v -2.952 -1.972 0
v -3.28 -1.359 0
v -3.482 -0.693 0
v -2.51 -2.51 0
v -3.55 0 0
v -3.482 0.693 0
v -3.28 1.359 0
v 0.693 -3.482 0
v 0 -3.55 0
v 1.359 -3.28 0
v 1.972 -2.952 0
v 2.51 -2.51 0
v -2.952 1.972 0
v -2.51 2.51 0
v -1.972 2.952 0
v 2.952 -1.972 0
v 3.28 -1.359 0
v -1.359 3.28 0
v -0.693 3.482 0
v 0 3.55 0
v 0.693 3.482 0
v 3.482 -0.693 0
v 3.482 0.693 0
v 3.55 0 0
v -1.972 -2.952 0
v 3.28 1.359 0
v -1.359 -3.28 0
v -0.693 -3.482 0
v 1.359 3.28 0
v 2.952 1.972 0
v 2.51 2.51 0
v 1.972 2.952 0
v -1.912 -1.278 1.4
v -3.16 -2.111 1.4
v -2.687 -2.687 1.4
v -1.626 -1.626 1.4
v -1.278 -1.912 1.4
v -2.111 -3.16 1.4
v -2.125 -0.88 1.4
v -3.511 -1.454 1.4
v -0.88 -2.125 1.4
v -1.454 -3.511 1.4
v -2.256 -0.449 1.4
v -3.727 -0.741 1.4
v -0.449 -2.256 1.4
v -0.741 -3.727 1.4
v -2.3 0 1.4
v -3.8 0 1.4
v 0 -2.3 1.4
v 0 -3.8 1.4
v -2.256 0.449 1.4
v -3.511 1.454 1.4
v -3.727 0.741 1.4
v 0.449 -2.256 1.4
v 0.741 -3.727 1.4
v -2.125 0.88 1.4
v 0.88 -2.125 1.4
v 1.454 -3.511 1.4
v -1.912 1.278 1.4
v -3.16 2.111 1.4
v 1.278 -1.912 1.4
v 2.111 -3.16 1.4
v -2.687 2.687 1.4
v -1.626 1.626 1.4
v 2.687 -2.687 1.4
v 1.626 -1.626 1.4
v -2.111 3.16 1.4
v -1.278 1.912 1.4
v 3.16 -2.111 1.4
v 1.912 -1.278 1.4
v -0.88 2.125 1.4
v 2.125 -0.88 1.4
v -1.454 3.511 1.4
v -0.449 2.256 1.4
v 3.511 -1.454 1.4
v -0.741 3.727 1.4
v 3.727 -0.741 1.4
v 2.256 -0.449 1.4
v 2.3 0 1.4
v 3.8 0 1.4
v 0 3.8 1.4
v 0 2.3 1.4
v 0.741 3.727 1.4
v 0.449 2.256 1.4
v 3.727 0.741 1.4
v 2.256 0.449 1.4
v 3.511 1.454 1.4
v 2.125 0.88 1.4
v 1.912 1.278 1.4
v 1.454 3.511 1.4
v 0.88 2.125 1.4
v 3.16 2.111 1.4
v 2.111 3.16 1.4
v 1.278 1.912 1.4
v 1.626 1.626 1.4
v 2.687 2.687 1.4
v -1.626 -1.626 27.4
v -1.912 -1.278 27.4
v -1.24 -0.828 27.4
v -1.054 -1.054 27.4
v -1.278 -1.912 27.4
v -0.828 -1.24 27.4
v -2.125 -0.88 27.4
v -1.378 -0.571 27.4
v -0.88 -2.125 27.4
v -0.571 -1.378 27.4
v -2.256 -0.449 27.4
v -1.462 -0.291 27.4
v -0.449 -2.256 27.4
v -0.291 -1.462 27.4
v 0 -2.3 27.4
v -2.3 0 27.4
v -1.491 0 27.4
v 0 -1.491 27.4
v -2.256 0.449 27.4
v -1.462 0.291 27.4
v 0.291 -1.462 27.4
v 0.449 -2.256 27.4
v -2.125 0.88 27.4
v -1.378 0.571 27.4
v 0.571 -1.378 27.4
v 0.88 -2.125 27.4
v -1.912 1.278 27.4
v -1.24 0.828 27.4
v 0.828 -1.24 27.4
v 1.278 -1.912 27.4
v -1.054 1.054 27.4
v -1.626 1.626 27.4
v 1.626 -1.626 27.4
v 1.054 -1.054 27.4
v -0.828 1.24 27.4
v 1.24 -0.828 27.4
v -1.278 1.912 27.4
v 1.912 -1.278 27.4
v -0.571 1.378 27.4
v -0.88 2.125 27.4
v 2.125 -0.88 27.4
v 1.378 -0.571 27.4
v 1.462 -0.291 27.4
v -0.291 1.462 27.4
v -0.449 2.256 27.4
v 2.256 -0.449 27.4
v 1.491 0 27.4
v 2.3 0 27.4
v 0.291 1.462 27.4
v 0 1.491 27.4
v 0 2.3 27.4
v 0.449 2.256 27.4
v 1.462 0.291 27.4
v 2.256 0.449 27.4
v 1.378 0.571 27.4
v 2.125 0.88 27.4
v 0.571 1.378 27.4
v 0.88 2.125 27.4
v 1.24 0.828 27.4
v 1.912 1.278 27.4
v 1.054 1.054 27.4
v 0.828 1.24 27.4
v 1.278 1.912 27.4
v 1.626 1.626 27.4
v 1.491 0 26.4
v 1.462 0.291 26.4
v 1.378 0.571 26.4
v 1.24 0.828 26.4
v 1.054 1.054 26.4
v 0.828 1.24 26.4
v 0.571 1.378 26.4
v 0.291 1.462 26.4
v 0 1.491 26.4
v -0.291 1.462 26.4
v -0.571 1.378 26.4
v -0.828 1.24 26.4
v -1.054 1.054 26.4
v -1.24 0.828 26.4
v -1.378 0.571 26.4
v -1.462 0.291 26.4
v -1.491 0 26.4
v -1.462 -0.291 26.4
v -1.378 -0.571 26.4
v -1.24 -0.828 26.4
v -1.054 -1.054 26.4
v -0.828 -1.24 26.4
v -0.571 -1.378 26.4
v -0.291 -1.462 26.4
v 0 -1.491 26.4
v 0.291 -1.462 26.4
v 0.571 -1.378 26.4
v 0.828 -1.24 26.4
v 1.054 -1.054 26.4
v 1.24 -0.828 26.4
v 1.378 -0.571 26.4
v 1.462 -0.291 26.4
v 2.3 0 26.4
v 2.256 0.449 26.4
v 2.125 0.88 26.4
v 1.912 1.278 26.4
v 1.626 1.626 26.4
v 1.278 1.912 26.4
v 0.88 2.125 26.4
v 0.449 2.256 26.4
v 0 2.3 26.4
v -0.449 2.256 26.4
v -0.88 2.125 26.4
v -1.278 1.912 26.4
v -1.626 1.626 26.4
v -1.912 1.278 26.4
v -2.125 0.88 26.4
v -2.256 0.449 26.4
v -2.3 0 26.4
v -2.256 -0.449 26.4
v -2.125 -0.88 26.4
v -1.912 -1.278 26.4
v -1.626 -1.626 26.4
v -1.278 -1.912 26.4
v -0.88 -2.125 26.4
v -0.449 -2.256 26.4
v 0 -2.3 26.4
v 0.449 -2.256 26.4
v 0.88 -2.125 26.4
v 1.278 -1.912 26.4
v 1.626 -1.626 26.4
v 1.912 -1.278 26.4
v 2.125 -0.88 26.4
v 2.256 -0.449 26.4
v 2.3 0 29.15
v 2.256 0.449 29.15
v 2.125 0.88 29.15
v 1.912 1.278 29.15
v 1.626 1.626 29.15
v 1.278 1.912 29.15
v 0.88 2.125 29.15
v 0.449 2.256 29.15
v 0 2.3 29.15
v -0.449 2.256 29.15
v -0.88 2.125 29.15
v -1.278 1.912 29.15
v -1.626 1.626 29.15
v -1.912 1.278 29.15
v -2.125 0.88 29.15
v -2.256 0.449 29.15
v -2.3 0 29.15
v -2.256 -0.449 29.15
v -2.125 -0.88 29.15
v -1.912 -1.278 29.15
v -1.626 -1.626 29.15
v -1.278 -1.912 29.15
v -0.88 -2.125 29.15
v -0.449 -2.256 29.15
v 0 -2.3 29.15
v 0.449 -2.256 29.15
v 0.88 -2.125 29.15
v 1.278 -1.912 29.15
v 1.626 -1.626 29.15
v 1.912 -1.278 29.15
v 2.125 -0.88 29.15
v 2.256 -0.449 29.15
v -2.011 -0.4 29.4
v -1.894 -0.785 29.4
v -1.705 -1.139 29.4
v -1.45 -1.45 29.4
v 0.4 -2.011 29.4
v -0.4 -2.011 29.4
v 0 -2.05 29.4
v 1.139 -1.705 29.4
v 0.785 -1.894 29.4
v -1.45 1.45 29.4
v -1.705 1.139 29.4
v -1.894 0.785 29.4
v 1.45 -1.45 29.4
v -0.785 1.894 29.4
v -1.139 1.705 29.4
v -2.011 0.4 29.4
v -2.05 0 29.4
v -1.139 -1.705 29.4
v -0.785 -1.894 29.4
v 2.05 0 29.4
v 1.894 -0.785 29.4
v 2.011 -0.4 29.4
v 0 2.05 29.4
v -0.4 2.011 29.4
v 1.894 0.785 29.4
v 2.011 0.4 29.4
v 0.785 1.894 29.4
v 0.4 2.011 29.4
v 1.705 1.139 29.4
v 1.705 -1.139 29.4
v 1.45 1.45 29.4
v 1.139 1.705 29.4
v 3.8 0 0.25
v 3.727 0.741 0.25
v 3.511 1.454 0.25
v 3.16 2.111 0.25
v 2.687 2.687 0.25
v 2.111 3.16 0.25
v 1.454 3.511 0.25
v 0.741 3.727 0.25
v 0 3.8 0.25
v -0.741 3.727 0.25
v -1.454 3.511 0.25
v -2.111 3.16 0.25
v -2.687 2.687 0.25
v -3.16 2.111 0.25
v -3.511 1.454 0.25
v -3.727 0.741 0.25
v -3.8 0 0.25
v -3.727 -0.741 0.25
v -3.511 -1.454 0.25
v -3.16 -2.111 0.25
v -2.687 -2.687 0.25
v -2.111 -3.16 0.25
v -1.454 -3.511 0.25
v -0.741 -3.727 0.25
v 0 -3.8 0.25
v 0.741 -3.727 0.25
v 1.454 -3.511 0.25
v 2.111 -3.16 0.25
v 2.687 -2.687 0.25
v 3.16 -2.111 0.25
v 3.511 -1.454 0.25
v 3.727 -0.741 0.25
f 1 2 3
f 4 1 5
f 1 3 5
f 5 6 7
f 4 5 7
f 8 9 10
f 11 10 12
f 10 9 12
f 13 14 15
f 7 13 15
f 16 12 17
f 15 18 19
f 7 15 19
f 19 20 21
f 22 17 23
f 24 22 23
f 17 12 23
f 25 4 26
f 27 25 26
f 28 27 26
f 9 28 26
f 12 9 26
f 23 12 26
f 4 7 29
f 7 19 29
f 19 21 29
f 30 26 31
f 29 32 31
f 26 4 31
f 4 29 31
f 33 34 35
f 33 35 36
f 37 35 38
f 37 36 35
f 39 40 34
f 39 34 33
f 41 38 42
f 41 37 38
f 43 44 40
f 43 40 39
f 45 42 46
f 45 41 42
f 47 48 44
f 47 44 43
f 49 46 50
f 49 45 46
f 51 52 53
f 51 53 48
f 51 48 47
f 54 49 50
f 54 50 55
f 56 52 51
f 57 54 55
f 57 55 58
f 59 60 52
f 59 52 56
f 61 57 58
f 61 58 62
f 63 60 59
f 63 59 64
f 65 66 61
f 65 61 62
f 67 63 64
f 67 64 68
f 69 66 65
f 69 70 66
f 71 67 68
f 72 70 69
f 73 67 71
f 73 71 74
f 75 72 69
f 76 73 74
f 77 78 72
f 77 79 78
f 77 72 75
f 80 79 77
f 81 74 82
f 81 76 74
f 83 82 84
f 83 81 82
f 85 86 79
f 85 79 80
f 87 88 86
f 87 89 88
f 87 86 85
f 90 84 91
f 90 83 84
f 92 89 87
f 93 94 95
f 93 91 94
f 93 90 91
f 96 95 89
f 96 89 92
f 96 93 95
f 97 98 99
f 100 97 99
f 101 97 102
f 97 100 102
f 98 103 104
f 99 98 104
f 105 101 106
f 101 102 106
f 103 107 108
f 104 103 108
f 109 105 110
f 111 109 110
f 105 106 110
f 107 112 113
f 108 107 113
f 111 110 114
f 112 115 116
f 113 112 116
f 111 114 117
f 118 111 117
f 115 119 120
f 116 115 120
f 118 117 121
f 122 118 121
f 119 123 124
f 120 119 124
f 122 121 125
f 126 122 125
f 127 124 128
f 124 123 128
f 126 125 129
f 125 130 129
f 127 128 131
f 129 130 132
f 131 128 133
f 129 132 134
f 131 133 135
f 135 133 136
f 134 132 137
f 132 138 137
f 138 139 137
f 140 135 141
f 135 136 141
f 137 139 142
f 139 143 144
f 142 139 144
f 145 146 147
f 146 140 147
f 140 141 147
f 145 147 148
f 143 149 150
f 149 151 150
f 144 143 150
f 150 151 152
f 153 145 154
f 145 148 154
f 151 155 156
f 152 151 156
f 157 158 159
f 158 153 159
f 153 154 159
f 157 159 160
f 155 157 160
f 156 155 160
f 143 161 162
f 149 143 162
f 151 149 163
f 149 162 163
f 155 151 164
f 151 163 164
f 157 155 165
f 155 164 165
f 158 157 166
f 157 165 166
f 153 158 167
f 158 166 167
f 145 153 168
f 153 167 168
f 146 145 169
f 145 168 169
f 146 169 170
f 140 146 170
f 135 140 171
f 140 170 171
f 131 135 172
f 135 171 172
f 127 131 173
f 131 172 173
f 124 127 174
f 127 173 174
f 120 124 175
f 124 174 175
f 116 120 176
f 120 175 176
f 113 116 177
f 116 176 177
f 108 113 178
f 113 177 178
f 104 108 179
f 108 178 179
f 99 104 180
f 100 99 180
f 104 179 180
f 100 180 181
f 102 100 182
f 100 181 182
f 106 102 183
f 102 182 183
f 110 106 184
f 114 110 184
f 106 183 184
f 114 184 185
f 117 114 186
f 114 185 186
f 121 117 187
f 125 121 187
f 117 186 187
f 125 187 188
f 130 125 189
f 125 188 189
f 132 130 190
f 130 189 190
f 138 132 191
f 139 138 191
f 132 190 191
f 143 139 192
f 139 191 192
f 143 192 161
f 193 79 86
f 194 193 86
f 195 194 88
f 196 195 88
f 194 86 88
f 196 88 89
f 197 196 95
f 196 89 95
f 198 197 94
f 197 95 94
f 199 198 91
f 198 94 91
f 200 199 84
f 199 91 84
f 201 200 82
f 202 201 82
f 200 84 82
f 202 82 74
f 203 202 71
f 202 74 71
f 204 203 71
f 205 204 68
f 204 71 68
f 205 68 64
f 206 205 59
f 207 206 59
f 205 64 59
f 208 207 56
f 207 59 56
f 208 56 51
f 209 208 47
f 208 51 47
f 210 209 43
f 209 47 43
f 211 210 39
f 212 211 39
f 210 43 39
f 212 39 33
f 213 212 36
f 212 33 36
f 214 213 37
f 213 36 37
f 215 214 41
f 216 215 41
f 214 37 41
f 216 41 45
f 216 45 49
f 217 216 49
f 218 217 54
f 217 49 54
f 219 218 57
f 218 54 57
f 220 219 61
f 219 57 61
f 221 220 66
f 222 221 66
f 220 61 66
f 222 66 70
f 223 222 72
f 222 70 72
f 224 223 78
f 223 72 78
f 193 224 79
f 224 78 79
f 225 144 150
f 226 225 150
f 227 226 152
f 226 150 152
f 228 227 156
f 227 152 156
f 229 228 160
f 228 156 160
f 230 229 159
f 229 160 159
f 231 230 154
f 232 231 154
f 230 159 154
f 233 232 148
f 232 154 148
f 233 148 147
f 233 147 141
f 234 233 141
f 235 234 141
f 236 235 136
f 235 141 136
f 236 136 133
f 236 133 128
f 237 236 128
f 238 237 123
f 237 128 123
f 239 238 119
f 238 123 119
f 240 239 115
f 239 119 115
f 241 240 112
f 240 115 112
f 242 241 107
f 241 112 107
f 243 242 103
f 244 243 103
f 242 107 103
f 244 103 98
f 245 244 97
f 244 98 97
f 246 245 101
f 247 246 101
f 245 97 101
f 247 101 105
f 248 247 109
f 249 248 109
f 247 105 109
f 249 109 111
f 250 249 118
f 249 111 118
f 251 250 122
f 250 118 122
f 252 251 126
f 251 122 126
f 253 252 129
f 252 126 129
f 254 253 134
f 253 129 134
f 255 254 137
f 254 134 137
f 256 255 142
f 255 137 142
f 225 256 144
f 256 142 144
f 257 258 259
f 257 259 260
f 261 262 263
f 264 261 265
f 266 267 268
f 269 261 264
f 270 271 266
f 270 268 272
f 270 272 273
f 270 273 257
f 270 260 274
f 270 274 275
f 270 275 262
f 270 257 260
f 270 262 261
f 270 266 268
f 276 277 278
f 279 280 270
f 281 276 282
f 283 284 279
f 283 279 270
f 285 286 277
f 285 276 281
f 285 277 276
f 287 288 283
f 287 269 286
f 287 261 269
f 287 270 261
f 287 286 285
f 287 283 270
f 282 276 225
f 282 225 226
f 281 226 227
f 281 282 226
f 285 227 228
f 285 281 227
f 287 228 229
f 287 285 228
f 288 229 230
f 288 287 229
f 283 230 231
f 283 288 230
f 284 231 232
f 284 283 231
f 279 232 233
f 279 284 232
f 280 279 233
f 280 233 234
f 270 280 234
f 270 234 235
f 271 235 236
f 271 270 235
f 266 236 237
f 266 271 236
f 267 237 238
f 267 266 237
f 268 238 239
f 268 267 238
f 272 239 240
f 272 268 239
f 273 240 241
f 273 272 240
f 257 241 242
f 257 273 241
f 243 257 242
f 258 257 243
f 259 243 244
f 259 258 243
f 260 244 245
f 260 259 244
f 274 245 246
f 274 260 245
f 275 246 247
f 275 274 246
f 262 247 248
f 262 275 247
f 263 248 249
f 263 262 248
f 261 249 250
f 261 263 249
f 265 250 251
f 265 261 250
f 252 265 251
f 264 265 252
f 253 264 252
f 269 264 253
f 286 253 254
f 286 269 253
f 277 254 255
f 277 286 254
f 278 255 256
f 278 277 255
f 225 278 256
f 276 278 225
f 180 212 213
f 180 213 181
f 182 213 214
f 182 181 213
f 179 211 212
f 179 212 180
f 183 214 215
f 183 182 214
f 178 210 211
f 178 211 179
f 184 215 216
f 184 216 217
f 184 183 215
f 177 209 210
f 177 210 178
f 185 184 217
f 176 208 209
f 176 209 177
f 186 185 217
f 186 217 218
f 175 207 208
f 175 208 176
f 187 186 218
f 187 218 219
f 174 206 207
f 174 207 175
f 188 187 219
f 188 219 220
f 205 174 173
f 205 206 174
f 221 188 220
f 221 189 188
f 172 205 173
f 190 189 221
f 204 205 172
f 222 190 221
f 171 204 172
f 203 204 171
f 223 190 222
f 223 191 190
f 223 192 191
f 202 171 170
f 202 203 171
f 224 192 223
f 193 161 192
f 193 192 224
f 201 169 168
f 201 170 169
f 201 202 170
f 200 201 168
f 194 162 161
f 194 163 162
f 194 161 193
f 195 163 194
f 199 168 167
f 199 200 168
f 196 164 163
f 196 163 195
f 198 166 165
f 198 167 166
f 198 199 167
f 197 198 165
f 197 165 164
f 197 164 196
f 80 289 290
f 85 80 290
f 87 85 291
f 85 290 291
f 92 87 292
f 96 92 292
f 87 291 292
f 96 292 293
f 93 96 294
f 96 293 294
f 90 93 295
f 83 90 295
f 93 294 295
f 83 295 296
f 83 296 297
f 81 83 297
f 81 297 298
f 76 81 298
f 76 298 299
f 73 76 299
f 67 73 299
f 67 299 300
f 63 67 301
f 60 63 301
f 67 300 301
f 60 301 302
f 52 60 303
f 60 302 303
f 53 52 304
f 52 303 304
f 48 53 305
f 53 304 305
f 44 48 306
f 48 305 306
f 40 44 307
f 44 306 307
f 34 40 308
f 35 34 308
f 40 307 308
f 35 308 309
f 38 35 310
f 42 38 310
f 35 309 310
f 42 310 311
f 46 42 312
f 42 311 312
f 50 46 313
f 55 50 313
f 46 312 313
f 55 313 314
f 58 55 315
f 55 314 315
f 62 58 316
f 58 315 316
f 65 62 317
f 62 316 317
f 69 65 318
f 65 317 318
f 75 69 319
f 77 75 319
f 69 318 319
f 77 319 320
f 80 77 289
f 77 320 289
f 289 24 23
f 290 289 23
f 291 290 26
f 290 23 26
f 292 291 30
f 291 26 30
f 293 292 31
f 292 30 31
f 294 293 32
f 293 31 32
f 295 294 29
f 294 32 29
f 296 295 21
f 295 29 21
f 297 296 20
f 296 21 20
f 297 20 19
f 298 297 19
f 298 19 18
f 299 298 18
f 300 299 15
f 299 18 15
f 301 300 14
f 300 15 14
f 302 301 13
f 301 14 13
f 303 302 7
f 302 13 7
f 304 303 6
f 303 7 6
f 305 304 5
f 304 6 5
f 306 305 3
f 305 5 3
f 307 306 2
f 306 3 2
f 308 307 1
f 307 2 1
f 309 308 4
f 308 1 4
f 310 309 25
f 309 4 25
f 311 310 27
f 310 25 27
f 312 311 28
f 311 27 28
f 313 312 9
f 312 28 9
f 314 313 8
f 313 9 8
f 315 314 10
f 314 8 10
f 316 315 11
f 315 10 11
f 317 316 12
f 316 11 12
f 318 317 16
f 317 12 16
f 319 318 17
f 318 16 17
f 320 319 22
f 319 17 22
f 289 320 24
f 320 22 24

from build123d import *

# Parameters (mm, degrees)
SKETCH_R     = 3.8
PAD_DEPTH    = 1.4
SKETCH001_R  = 2.3
PAD001_DEPTH = 25
SKETCH002_R  = 1.491152
PAD002_DEPTH = 1
SKETCH003_R  = 2.3
PAD003_DEPTH = 2
CHAMFER_SIZE = 0.25


with BuildPart() as part:
    # Sketch → Pad (new body)
    with BuildSketch(Plane.XY):
        Circle(SKETCH_R)
    extrude(amount=PAD_DEPTH)

    # Sketch001 (on Face3 of Pad) → Pad001 (join)
    with BuildSketch(Plane.XY.offset(1.4)):
        Circle(SKETCH001_R)
    extrude(amount=PAD001_DEPTH)

    # Sketch002 (on Face5 of Pad001) → Pad002 (join)
    with BuildSketch(Plane.XY.offset(26.4)):
        Circle(SKETCH002_R)
    extrude(amount=PAD002_DEPTH)

    # Sketch003 (on Face7 of Pad002) → Pad003 (join)
    with BuildSketch(Plane.XY.offset(27.4)):
        Circle(SKETCH003_R)
    extrude(amount=PAD003_DEPTH)

    # Chamfer
    chamfer_edges = [part.edges().sort_by_distance(p)[0] for p in [
        (-2.3, 0, 29.4),
        (-3.8, 0, 0),
    ]]
    chamfer(chamfer_edges, length=CHAMFER_SIZE)


solid = part.part
